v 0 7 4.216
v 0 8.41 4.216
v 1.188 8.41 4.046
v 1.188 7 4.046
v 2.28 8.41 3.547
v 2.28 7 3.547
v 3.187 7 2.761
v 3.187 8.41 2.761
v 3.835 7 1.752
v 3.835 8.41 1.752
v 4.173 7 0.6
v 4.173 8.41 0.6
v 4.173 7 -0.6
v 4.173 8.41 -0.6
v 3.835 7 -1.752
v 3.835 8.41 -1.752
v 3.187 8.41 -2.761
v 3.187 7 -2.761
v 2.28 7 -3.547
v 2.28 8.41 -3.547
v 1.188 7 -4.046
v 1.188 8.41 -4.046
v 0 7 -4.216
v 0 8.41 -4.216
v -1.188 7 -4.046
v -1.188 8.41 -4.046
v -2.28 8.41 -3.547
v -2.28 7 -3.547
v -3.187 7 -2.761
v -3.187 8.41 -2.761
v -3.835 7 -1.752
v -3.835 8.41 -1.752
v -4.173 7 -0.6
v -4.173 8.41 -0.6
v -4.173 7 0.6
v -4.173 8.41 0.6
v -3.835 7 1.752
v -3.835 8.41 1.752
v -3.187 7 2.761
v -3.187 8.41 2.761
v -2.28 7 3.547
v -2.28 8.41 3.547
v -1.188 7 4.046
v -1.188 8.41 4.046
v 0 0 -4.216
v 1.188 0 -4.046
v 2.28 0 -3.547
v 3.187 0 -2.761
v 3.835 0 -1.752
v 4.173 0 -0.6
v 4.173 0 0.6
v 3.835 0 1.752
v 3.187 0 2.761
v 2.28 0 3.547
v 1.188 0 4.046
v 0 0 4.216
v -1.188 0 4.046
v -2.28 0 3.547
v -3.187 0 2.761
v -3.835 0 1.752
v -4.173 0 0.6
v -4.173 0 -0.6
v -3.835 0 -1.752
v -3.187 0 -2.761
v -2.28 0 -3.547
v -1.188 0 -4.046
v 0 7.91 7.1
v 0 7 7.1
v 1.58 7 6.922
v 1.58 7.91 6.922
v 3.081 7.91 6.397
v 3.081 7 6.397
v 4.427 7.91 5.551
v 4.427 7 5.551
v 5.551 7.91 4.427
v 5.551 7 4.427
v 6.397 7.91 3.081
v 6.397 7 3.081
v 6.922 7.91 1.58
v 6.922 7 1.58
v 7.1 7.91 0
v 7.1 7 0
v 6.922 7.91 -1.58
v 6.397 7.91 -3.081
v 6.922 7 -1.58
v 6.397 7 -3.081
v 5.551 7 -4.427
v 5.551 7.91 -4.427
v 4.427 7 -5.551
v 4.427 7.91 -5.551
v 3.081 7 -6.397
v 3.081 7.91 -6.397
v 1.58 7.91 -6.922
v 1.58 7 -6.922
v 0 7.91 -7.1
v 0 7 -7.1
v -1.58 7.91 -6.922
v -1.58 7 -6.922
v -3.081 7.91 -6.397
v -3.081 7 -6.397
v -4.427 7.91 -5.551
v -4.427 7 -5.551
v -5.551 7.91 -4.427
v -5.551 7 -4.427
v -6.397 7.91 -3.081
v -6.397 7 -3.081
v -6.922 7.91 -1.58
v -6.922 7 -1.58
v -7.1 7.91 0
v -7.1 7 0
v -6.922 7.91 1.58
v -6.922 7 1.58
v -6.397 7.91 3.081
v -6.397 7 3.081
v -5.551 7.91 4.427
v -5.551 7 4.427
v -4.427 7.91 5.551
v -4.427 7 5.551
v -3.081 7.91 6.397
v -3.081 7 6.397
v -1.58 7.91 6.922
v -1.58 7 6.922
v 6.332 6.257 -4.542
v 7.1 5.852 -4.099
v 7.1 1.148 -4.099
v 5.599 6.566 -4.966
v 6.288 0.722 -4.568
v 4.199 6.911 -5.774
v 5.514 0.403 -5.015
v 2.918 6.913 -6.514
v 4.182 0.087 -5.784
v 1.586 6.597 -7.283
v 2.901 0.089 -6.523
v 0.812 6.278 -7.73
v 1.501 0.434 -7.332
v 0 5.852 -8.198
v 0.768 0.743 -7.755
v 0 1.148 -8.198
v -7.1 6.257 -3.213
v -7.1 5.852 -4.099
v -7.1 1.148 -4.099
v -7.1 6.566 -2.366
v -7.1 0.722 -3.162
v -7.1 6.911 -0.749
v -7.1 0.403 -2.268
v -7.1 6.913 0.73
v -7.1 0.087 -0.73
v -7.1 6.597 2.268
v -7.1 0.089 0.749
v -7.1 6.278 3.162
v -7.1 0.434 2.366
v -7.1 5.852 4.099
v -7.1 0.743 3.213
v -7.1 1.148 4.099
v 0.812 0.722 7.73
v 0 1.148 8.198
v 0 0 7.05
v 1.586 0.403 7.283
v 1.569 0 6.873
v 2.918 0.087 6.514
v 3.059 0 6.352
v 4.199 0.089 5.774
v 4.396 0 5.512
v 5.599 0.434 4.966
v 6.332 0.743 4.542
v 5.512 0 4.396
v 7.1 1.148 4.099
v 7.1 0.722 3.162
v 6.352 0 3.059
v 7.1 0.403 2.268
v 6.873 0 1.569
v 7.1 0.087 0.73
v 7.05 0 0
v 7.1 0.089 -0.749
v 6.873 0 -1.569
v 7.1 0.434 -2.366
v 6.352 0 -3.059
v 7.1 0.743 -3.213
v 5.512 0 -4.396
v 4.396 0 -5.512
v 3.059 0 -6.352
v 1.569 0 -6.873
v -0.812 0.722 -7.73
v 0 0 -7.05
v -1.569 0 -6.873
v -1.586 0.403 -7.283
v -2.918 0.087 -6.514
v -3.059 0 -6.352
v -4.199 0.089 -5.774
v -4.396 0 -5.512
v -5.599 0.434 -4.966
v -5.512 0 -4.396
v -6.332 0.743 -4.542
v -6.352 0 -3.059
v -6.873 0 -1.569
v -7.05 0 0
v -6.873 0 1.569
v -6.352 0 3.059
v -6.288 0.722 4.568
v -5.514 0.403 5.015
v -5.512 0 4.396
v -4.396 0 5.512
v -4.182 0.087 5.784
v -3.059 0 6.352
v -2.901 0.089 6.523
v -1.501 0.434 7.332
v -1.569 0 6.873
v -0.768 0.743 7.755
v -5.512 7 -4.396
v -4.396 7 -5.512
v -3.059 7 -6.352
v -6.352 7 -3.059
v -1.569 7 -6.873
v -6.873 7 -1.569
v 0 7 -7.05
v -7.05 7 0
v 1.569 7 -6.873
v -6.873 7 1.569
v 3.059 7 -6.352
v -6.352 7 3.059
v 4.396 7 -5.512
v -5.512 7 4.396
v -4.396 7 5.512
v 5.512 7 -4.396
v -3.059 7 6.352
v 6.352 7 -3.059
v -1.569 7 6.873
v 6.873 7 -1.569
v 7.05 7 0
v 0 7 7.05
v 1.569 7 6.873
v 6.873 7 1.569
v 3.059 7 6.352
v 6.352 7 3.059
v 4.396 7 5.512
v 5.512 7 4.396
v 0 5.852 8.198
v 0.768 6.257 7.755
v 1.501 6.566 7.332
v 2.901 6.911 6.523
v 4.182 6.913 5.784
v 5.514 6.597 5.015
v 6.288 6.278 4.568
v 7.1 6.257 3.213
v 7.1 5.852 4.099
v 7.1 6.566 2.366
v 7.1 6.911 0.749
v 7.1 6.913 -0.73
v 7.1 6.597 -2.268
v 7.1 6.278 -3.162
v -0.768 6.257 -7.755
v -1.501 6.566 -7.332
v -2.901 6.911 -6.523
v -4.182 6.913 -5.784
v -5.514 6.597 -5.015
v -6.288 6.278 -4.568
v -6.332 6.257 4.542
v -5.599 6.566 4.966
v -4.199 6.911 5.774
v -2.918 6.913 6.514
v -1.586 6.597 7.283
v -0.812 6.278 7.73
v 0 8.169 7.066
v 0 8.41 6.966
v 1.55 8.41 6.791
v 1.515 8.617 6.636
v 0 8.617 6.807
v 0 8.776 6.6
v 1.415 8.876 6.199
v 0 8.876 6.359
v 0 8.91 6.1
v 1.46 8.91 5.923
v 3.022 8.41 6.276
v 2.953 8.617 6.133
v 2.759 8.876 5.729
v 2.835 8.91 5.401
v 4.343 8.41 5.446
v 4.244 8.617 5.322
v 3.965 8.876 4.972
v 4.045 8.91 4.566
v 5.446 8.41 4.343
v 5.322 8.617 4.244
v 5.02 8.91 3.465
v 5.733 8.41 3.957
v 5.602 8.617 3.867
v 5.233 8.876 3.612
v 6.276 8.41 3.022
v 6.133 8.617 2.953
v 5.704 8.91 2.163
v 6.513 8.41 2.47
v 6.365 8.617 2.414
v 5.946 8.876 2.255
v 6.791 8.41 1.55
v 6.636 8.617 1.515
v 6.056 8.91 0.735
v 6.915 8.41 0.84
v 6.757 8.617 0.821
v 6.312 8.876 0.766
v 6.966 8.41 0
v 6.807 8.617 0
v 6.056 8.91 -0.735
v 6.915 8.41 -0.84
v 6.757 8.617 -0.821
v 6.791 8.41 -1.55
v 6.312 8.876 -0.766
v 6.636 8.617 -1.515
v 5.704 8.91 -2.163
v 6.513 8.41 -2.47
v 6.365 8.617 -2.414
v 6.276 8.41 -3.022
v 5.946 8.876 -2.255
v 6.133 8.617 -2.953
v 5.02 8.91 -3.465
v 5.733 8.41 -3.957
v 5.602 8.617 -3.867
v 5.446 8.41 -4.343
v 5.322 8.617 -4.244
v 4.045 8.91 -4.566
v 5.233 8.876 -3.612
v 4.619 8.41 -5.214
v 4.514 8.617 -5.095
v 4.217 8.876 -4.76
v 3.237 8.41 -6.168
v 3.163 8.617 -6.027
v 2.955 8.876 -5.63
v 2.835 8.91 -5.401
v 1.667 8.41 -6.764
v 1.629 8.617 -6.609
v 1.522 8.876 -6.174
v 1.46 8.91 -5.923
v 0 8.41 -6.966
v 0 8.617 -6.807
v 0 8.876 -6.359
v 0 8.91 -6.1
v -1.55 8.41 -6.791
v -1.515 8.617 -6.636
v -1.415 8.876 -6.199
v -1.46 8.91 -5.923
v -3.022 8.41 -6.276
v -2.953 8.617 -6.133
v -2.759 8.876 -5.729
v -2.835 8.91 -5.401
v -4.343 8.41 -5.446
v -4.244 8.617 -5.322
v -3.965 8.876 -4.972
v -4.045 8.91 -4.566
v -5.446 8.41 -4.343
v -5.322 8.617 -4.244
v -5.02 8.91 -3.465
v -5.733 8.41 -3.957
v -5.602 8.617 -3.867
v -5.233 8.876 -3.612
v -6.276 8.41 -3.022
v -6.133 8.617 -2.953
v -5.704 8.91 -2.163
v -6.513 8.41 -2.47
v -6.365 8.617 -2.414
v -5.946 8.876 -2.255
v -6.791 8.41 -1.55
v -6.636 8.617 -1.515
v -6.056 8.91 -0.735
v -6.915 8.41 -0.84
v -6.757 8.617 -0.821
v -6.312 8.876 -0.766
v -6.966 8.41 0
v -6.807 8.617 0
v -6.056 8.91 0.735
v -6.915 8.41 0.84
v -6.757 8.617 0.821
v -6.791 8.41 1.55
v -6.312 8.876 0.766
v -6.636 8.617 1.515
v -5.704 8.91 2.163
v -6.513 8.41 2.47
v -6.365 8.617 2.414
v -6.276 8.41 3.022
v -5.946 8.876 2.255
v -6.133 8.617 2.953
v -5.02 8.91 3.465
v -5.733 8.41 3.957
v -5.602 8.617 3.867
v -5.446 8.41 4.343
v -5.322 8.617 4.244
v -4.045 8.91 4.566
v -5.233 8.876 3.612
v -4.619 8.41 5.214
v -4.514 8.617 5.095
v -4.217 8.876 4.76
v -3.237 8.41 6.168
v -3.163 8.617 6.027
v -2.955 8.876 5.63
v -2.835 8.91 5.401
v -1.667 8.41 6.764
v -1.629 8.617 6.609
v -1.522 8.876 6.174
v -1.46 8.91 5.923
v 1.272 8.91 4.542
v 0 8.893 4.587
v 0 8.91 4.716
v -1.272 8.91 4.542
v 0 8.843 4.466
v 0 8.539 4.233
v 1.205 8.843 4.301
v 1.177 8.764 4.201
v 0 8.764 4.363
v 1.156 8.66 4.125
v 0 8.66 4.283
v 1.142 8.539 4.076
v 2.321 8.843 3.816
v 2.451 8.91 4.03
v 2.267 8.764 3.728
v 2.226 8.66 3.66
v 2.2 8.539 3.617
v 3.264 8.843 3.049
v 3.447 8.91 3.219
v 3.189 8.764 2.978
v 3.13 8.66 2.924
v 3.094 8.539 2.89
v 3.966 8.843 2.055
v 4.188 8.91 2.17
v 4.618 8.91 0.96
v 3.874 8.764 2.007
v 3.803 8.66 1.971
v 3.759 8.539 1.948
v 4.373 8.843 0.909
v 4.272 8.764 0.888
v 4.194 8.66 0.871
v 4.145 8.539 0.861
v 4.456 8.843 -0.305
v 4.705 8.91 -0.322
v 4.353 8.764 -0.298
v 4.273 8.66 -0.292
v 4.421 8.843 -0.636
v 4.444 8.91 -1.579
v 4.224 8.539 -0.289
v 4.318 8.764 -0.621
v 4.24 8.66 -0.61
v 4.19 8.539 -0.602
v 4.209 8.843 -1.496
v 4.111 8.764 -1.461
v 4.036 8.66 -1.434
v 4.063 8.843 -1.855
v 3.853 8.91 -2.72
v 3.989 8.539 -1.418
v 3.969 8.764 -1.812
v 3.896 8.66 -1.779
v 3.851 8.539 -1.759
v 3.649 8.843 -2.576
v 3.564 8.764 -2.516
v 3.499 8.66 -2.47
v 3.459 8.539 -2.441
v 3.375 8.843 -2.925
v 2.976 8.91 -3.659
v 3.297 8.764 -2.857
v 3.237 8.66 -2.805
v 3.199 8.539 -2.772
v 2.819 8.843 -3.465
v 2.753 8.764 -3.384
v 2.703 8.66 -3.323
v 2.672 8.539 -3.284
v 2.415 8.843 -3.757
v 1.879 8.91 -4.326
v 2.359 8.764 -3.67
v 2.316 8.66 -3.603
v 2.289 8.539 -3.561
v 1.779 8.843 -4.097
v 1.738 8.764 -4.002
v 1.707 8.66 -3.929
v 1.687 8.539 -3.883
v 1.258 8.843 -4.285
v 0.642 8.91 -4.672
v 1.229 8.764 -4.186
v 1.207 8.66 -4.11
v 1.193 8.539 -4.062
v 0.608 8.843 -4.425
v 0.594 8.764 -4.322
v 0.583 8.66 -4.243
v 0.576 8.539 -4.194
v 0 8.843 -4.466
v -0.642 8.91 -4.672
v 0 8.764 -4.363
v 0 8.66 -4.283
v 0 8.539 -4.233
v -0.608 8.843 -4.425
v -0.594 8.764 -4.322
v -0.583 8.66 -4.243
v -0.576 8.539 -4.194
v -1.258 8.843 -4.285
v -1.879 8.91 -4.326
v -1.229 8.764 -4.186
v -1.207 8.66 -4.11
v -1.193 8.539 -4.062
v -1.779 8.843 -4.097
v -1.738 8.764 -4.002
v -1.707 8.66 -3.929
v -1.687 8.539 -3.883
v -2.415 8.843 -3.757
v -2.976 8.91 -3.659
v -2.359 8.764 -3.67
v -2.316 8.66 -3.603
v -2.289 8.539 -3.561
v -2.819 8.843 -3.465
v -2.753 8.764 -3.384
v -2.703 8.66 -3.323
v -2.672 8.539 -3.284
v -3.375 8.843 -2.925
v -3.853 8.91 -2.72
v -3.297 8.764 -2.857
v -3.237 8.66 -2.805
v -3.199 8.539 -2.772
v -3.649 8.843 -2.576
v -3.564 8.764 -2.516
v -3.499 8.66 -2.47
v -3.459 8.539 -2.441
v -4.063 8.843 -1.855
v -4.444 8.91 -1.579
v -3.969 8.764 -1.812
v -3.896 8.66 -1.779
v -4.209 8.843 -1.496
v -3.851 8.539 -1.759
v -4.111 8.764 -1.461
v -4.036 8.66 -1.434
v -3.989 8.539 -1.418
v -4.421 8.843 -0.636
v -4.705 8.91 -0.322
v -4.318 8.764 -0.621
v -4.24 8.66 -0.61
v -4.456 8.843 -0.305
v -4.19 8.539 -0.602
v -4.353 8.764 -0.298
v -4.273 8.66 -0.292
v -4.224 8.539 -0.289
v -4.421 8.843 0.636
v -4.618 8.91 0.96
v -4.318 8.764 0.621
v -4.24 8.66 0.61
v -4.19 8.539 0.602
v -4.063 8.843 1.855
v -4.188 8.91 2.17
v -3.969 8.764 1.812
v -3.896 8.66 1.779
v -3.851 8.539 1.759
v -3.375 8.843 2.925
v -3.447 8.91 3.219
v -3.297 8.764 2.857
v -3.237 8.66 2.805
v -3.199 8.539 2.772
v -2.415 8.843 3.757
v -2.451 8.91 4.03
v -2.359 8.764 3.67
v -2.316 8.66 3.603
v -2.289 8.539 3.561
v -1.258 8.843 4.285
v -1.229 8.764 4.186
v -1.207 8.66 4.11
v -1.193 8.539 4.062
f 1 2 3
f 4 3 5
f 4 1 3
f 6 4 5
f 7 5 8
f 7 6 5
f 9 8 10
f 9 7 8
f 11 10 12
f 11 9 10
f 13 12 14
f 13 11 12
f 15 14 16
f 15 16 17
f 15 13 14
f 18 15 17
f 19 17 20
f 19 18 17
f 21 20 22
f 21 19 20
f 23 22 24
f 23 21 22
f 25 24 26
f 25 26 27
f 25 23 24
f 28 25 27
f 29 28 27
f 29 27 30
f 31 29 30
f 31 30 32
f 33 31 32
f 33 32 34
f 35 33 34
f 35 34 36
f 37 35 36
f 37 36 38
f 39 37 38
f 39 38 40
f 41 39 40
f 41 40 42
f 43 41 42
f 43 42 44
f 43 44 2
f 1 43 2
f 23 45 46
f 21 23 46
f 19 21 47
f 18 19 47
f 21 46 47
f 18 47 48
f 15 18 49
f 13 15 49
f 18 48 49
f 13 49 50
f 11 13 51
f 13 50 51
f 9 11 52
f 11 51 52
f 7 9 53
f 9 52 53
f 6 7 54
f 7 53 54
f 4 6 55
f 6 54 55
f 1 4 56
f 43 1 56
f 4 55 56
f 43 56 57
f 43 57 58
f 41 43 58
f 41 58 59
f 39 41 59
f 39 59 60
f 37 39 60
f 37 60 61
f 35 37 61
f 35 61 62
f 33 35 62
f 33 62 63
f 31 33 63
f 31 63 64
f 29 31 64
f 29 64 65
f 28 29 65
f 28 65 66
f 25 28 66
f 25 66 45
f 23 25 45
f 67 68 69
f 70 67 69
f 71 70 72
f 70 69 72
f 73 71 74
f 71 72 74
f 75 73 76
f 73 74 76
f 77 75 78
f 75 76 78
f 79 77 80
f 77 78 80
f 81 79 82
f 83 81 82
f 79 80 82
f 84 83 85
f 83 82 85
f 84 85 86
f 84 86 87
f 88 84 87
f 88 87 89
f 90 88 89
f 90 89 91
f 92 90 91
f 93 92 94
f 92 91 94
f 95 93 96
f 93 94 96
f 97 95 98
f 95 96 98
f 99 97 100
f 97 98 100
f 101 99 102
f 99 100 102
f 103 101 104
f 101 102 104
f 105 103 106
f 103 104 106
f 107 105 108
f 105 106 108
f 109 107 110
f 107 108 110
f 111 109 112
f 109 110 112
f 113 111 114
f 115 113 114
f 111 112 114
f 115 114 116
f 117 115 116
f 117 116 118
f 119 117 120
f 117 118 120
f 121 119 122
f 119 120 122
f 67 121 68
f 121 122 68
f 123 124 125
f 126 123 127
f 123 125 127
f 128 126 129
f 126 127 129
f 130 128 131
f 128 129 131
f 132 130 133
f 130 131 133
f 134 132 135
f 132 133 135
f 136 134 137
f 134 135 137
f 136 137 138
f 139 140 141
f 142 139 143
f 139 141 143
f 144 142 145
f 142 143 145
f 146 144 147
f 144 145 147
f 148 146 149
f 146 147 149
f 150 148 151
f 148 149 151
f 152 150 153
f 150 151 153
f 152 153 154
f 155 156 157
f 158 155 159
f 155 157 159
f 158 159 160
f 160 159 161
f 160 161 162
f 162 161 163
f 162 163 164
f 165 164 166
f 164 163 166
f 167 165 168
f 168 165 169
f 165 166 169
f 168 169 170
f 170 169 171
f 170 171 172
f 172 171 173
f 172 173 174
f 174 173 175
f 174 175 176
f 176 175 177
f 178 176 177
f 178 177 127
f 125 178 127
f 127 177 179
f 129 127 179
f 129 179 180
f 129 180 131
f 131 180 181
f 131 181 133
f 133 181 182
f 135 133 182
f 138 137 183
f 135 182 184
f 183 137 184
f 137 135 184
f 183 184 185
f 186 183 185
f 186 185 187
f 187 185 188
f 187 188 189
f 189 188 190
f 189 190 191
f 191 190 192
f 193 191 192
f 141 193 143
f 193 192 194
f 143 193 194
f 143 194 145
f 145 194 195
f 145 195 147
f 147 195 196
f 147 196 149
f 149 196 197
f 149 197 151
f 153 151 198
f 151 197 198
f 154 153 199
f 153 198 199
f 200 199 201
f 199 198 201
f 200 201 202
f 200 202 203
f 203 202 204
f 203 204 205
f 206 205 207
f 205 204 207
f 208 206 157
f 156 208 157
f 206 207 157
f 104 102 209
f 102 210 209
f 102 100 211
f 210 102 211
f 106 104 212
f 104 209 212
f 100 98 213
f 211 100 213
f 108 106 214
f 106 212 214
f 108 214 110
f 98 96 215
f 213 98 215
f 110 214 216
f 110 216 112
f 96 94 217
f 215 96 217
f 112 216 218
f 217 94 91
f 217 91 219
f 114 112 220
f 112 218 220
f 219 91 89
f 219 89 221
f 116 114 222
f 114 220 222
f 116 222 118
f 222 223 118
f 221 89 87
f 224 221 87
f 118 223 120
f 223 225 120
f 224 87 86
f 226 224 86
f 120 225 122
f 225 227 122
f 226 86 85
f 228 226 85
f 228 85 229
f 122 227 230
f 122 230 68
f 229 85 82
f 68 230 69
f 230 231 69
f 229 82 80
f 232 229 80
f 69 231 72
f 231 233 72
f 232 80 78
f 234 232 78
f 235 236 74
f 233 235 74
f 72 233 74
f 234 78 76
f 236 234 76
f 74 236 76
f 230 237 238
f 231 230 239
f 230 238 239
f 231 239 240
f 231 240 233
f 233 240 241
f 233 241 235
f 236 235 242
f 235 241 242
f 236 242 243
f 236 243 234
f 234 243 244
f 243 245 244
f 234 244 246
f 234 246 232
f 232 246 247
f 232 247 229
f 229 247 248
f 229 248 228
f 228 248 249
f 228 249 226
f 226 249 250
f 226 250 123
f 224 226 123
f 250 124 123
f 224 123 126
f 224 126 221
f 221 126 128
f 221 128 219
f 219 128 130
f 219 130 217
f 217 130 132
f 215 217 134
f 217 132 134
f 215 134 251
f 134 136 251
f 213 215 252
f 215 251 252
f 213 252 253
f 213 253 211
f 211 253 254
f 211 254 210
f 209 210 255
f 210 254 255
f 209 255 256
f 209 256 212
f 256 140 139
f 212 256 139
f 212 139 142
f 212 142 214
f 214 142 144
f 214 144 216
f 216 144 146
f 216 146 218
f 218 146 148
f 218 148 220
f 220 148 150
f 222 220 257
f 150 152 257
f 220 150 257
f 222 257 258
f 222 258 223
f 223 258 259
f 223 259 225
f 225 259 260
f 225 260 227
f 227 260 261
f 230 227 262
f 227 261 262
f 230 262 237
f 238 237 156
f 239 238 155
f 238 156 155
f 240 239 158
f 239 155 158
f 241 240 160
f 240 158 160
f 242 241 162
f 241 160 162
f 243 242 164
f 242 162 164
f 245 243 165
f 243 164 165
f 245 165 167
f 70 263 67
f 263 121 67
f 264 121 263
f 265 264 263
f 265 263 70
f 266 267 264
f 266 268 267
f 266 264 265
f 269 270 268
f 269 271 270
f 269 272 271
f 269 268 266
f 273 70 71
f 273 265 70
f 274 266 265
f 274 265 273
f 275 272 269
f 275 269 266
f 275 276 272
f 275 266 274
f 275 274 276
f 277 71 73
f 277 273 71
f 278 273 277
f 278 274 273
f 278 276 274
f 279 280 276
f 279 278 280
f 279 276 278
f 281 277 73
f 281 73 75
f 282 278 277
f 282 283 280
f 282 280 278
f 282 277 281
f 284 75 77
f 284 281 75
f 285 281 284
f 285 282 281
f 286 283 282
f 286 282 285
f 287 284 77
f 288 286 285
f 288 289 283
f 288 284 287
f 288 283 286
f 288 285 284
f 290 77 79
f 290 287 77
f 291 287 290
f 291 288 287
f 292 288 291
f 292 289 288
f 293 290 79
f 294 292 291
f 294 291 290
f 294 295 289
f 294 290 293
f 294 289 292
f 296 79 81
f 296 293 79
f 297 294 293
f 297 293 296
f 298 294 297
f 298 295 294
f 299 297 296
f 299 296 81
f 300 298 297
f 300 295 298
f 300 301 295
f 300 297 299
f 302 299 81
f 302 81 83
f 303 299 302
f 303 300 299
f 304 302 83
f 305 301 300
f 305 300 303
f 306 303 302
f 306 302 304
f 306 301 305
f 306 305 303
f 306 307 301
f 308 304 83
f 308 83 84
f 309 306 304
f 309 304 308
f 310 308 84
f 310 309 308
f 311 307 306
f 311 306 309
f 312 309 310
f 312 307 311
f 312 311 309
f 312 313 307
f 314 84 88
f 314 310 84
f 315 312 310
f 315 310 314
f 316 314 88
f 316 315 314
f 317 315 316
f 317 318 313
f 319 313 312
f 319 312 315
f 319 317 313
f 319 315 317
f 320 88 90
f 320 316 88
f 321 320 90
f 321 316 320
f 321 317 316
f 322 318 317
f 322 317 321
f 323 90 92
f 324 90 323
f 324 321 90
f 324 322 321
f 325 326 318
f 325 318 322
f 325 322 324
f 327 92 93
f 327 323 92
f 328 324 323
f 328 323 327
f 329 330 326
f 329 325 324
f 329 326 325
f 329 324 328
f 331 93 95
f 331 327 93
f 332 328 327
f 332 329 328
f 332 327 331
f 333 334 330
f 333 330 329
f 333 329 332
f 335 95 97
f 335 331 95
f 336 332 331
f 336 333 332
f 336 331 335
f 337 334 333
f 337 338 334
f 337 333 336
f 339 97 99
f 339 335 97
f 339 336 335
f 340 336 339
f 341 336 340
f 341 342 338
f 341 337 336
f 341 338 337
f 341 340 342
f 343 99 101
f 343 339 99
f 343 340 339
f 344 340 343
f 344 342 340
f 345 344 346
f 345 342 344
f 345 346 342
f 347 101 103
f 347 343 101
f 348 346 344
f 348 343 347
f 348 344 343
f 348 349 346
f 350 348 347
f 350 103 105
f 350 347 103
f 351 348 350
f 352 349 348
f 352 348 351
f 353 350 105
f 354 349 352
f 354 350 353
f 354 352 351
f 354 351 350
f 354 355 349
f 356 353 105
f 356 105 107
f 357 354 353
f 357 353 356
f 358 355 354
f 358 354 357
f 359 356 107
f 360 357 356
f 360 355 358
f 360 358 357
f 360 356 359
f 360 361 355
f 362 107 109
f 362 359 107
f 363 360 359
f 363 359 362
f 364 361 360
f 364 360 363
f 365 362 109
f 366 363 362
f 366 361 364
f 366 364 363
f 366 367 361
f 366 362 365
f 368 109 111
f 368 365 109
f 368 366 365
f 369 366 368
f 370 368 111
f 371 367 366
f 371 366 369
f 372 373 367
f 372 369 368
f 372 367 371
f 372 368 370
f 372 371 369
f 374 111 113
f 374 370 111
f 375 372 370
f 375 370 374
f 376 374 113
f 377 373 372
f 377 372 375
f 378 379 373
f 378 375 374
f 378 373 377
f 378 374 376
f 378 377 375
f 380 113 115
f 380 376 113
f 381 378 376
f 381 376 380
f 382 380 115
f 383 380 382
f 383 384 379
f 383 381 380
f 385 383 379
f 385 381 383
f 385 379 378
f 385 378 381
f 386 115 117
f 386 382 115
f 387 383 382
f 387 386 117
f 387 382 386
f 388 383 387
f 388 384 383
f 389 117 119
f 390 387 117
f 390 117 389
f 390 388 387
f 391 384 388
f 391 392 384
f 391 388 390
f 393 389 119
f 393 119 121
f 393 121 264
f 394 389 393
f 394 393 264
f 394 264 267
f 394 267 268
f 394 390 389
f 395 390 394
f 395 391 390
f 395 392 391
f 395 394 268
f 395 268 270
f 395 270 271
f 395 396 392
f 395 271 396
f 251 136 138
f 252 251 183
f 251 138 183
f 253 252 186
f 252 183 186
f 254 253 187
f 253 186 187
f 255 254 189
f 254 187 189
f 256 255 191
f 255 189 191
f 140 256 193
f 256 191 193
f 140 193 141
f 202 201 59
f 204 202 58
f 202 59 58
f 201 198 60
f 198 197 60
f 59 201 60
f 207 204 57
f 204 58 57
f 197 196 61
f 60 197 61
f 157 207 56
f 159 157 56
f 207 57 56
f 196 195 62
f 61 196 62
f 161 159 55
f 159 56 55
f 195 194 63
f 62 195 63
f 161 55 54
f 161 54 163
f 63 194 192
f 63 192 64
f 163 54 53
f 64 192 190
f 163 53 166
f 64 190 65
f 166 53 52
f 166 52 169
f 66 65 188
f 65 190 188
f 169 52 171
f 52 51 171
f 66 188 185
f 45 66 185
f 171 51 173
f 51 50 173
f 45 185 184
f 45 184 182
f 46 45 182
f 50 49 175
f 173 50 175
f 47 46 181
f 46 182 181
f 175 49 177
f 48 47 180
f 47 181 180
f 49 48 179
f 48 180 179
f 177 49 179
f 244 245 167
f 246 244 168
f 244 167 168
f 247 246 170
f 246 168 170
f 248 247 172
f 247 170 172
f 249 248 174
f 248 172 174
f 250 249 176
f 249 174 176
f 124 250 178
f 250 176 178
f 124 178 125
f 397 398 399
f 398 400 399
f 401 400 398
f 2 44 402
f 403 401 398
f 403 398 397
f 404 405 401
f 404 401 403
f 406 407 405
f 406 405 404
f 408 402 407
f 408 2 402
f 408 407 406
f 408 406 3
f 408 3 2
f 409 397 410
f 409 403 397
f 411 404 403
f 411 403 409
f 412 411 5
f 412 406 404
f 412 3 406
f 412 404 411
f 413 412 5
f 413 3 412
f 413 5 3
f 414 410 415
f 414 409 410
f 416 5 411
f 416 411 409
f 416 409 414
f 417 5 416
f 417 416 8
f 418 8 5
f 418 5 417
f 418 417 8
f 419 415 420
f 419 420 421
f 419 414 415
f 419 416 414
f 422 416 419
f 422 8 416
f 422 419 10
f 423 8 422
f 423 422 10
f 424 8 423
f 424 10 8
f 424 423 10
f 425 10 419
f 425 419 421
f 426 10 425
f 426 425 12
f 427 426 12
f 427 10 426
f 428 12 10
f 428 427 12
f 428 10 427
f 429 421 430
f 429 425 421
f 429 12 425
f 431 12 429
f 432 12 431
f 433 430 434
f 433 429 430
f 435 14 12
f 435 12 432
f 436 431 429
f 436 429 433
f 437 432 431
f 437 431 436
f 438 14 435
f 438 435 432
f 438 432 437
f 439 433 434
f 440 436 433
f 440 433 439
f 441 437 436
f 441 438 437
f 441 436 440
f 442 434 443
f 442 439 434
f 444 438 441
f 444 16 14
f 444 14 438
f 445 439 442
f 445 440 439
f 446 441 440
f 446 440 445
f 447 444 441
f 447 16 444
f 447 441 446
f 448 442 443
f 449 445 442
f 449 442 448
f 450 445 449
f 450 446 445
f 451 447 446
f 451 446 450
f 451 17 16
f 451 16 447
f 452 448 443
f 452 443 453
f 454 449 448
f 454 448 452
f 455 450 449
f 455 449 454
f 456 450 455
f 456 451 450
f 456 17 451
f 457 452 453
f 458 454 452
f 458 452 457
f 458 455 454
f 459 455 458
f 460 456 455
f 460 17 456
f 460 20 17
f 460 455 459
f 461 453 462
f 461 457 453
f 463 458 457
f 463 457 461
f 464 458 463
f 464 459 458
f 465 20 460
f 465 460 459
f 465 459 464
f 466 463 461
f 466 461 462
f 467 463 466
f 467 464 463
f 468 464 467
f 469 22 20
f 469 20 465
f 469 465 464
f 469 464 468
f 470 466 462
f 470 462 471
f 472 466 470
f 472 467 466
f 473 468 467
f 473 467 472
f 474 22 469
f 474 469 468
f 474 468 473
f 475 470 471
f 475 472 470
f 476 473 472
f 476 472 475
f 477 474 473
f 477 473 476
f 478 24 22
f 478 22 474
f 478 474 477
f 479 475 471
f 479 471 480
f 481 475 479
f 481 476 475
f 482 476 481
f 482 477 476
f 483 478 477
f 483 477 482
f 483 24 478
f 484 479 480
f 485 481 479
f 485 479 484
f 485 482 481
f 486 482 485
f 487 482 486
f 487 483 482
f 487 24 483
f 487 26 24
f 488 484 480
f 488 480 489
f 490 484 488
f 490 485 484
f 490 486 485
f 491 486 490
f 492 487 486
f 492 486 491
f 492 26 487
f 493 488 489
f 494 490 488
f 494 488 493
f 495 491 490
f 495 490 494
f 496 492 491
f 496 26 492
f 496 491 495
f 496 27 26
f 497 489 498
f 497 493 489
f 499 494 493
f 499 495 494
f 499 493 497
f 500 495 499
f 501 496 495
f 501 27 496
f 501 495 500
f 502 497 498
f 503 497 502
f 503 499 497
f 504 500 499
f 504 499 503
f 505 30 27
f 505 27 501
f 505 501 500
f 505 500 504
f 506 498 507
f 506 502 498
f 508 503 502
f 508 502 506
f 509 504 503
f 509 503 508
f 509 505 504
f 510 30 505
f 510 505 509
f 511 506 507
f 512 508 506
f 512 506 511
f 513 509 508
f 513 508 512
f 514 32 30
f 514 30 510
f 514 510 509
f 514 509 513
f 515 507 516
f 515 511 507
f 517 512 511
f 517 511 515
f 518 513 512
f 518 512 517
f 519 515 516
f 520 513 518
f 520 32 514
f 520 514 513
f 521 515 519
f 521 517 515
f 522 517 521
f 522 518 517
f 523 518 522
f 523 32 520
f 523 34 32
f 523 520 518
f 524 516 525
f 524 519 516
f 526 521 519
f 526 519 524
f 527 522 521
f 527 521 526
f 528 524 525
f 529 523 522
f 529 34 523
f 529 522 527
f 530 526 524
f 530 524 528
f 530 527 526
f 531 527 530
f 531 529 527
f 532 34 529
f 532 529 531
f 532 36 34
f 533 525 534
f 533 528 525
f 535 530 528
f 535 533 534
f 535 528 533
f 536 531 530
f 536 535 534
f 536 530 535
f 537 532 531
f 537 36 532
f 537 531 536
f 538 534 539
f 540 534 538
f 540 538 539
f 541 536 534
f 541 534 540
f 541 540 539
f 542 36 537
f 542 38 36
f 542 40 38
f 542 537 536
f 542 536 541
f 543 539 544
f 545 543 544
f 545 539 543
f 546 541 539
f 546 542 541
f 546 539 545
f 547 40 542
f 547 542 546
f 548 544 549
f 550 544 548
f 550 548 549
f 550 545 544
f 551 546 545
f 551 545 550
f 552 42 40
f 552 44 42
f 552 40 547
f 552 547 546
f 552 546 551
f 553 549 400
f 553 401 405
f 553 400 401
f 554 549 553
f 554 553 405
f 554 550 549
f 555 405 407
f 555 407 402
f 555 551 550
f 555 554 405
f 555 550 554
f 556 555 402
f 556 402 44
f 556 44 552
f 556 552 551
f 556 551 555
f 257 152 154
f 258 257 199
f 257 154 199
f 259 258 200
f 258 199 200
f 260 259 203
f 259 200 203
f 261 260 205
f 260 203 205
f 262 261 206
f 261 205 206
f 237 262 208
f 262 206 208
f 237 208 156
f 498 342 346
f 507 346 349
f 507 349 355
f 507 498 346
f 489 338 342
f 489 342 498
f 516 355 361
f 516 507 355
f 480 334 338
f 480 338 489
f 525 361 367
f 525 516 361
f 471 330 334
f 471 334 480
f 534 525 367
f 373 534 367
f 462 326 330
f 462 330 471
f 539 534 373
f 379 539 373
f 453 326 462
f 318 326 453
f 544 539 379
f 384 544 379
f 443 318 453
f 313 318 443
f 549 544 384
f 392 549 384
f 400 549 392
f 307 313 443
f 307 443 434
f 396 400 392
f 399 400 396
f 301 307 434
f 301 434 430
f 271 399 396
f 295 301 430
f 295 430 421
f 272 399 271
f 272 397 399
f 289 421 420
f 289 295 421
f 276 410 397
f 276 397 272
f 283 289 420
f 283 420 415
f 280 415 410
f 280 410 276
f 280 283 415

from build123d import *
from build123d.topology import SkipClean

# Parameters (mm, degrees)
SKETCH1_R                   = 4
BOSS_EXTRUDE1_DEPTH         = 7
F_3_8_24_TAPPED_HOLE6_D     = 8.4328
F_3_8_24_TAPPED_HOLE6_DEPTH = 15.3
F_3_8_24_TAPPED_HOLE6_TIP   = 2.533468714
SKETCH9_R                   = 7.1
SKETCH9_R_2                 = 4.2164
BOSS_EXTRUDE3_DEPTH         = 1.91
FILLET3_R                   = 1
FILLET4_R                   = 0.5


with BuildPart() as part:
    # Sketch1 → Boss-Extrude1 (new body)
    with BuildSketch(Plane(origin=(0, 0, 0), x_dir=(1, 0, 0), z_dir=(0, 1, 0))):
        Polygon((0, 8.198373822), (-7.1, 4.099186911), (-7.1, -4.099186911), (0, -8.198373822), (7.1, -4.099186911), (7.1, 4.099186911), align=None)
        Circle(SKETCH1_R, mode=Mode.SUBTRACT)
    extrude(amount=BOSS_EXTRUDE1_DEPTH)

    # 3/8-24 Tapped Hole6
    with Locations(Plane.ZX.offset(7)):
        with Locations((0, 0)):
            Hole(F_3_8_24_TAPPED_HOLE6_D / 2, depth=F_3_8_24_TAPPED_HOLE6_DEPTH)
            with Locations((0, 0, -(F_3_8_24_TAPPED_HOLE6_DEPTH + F_3_8_24_TAPPED_HOLE6_TIP / 2))):  # 118° drill point
                Cone(0, F_3_8_24_TAPPED_HOLE6_D / 2, F_3_8_24_TAPPED_HOLE6_TIP, mode=Mode.SUBTRACT)

    # Sketch8 → Cut-Revolve4 (revolve, cut)
    with BuildSketch(Plane.XY):
        Polygon((-6.55, -0.5), (-8.05, -0.5), (-11.05, -0.5), (-11.05, 1), (-11.05, 1.5), (-8.55, 1.5), align=None)
        Polygon((-11.05, 5.5), (-11.05, 6), (-11.05, 7.5), (-8.05, 7.5), (-6.55, 7.5), (-8.55, 5.5), align=None)
    revolve(axis=Axis((0, 0, 0), (0, 1, 0)), mode=Mode.SUBTRACT)

    # Sketch9 → Boss-Extrude3 (add)
    with SkipClean():  # the faces are left unmerged after this step: merging them gives an invalid solid
        with BuildSketch(Plane(origin=(0, 7, 0), x_dir=(1, 0, 0), z_dir=(0, 1, 0))):
            Circle(SKETCH9_R)
            Circle(SKETCH9_R_2, mode=Mode.SUBTRACT)
        extrude(amount=BOSS_EXTRUDE3_DEPTH)
    add(part.part.scale(1), mode=Mode.REPLACE)  # the faces are merged on a copy

    # Fillet3
    fillet3_edges = [part.edges().sort_by_distance(p)[0] for p in [
        (-7.1, 8.91, 0),
    ]]
    fillet(fillet3_edges, radius=FILLET3_R)

    # Fillet4
    fillet4_edges = [part.edges().sort_by_distance(p)[0] for p in [
        (-4.2164, 8.91, 0),
    ]]
    fillet(fillet4_edges, radius=FILLET4_R)


solid = part.part
